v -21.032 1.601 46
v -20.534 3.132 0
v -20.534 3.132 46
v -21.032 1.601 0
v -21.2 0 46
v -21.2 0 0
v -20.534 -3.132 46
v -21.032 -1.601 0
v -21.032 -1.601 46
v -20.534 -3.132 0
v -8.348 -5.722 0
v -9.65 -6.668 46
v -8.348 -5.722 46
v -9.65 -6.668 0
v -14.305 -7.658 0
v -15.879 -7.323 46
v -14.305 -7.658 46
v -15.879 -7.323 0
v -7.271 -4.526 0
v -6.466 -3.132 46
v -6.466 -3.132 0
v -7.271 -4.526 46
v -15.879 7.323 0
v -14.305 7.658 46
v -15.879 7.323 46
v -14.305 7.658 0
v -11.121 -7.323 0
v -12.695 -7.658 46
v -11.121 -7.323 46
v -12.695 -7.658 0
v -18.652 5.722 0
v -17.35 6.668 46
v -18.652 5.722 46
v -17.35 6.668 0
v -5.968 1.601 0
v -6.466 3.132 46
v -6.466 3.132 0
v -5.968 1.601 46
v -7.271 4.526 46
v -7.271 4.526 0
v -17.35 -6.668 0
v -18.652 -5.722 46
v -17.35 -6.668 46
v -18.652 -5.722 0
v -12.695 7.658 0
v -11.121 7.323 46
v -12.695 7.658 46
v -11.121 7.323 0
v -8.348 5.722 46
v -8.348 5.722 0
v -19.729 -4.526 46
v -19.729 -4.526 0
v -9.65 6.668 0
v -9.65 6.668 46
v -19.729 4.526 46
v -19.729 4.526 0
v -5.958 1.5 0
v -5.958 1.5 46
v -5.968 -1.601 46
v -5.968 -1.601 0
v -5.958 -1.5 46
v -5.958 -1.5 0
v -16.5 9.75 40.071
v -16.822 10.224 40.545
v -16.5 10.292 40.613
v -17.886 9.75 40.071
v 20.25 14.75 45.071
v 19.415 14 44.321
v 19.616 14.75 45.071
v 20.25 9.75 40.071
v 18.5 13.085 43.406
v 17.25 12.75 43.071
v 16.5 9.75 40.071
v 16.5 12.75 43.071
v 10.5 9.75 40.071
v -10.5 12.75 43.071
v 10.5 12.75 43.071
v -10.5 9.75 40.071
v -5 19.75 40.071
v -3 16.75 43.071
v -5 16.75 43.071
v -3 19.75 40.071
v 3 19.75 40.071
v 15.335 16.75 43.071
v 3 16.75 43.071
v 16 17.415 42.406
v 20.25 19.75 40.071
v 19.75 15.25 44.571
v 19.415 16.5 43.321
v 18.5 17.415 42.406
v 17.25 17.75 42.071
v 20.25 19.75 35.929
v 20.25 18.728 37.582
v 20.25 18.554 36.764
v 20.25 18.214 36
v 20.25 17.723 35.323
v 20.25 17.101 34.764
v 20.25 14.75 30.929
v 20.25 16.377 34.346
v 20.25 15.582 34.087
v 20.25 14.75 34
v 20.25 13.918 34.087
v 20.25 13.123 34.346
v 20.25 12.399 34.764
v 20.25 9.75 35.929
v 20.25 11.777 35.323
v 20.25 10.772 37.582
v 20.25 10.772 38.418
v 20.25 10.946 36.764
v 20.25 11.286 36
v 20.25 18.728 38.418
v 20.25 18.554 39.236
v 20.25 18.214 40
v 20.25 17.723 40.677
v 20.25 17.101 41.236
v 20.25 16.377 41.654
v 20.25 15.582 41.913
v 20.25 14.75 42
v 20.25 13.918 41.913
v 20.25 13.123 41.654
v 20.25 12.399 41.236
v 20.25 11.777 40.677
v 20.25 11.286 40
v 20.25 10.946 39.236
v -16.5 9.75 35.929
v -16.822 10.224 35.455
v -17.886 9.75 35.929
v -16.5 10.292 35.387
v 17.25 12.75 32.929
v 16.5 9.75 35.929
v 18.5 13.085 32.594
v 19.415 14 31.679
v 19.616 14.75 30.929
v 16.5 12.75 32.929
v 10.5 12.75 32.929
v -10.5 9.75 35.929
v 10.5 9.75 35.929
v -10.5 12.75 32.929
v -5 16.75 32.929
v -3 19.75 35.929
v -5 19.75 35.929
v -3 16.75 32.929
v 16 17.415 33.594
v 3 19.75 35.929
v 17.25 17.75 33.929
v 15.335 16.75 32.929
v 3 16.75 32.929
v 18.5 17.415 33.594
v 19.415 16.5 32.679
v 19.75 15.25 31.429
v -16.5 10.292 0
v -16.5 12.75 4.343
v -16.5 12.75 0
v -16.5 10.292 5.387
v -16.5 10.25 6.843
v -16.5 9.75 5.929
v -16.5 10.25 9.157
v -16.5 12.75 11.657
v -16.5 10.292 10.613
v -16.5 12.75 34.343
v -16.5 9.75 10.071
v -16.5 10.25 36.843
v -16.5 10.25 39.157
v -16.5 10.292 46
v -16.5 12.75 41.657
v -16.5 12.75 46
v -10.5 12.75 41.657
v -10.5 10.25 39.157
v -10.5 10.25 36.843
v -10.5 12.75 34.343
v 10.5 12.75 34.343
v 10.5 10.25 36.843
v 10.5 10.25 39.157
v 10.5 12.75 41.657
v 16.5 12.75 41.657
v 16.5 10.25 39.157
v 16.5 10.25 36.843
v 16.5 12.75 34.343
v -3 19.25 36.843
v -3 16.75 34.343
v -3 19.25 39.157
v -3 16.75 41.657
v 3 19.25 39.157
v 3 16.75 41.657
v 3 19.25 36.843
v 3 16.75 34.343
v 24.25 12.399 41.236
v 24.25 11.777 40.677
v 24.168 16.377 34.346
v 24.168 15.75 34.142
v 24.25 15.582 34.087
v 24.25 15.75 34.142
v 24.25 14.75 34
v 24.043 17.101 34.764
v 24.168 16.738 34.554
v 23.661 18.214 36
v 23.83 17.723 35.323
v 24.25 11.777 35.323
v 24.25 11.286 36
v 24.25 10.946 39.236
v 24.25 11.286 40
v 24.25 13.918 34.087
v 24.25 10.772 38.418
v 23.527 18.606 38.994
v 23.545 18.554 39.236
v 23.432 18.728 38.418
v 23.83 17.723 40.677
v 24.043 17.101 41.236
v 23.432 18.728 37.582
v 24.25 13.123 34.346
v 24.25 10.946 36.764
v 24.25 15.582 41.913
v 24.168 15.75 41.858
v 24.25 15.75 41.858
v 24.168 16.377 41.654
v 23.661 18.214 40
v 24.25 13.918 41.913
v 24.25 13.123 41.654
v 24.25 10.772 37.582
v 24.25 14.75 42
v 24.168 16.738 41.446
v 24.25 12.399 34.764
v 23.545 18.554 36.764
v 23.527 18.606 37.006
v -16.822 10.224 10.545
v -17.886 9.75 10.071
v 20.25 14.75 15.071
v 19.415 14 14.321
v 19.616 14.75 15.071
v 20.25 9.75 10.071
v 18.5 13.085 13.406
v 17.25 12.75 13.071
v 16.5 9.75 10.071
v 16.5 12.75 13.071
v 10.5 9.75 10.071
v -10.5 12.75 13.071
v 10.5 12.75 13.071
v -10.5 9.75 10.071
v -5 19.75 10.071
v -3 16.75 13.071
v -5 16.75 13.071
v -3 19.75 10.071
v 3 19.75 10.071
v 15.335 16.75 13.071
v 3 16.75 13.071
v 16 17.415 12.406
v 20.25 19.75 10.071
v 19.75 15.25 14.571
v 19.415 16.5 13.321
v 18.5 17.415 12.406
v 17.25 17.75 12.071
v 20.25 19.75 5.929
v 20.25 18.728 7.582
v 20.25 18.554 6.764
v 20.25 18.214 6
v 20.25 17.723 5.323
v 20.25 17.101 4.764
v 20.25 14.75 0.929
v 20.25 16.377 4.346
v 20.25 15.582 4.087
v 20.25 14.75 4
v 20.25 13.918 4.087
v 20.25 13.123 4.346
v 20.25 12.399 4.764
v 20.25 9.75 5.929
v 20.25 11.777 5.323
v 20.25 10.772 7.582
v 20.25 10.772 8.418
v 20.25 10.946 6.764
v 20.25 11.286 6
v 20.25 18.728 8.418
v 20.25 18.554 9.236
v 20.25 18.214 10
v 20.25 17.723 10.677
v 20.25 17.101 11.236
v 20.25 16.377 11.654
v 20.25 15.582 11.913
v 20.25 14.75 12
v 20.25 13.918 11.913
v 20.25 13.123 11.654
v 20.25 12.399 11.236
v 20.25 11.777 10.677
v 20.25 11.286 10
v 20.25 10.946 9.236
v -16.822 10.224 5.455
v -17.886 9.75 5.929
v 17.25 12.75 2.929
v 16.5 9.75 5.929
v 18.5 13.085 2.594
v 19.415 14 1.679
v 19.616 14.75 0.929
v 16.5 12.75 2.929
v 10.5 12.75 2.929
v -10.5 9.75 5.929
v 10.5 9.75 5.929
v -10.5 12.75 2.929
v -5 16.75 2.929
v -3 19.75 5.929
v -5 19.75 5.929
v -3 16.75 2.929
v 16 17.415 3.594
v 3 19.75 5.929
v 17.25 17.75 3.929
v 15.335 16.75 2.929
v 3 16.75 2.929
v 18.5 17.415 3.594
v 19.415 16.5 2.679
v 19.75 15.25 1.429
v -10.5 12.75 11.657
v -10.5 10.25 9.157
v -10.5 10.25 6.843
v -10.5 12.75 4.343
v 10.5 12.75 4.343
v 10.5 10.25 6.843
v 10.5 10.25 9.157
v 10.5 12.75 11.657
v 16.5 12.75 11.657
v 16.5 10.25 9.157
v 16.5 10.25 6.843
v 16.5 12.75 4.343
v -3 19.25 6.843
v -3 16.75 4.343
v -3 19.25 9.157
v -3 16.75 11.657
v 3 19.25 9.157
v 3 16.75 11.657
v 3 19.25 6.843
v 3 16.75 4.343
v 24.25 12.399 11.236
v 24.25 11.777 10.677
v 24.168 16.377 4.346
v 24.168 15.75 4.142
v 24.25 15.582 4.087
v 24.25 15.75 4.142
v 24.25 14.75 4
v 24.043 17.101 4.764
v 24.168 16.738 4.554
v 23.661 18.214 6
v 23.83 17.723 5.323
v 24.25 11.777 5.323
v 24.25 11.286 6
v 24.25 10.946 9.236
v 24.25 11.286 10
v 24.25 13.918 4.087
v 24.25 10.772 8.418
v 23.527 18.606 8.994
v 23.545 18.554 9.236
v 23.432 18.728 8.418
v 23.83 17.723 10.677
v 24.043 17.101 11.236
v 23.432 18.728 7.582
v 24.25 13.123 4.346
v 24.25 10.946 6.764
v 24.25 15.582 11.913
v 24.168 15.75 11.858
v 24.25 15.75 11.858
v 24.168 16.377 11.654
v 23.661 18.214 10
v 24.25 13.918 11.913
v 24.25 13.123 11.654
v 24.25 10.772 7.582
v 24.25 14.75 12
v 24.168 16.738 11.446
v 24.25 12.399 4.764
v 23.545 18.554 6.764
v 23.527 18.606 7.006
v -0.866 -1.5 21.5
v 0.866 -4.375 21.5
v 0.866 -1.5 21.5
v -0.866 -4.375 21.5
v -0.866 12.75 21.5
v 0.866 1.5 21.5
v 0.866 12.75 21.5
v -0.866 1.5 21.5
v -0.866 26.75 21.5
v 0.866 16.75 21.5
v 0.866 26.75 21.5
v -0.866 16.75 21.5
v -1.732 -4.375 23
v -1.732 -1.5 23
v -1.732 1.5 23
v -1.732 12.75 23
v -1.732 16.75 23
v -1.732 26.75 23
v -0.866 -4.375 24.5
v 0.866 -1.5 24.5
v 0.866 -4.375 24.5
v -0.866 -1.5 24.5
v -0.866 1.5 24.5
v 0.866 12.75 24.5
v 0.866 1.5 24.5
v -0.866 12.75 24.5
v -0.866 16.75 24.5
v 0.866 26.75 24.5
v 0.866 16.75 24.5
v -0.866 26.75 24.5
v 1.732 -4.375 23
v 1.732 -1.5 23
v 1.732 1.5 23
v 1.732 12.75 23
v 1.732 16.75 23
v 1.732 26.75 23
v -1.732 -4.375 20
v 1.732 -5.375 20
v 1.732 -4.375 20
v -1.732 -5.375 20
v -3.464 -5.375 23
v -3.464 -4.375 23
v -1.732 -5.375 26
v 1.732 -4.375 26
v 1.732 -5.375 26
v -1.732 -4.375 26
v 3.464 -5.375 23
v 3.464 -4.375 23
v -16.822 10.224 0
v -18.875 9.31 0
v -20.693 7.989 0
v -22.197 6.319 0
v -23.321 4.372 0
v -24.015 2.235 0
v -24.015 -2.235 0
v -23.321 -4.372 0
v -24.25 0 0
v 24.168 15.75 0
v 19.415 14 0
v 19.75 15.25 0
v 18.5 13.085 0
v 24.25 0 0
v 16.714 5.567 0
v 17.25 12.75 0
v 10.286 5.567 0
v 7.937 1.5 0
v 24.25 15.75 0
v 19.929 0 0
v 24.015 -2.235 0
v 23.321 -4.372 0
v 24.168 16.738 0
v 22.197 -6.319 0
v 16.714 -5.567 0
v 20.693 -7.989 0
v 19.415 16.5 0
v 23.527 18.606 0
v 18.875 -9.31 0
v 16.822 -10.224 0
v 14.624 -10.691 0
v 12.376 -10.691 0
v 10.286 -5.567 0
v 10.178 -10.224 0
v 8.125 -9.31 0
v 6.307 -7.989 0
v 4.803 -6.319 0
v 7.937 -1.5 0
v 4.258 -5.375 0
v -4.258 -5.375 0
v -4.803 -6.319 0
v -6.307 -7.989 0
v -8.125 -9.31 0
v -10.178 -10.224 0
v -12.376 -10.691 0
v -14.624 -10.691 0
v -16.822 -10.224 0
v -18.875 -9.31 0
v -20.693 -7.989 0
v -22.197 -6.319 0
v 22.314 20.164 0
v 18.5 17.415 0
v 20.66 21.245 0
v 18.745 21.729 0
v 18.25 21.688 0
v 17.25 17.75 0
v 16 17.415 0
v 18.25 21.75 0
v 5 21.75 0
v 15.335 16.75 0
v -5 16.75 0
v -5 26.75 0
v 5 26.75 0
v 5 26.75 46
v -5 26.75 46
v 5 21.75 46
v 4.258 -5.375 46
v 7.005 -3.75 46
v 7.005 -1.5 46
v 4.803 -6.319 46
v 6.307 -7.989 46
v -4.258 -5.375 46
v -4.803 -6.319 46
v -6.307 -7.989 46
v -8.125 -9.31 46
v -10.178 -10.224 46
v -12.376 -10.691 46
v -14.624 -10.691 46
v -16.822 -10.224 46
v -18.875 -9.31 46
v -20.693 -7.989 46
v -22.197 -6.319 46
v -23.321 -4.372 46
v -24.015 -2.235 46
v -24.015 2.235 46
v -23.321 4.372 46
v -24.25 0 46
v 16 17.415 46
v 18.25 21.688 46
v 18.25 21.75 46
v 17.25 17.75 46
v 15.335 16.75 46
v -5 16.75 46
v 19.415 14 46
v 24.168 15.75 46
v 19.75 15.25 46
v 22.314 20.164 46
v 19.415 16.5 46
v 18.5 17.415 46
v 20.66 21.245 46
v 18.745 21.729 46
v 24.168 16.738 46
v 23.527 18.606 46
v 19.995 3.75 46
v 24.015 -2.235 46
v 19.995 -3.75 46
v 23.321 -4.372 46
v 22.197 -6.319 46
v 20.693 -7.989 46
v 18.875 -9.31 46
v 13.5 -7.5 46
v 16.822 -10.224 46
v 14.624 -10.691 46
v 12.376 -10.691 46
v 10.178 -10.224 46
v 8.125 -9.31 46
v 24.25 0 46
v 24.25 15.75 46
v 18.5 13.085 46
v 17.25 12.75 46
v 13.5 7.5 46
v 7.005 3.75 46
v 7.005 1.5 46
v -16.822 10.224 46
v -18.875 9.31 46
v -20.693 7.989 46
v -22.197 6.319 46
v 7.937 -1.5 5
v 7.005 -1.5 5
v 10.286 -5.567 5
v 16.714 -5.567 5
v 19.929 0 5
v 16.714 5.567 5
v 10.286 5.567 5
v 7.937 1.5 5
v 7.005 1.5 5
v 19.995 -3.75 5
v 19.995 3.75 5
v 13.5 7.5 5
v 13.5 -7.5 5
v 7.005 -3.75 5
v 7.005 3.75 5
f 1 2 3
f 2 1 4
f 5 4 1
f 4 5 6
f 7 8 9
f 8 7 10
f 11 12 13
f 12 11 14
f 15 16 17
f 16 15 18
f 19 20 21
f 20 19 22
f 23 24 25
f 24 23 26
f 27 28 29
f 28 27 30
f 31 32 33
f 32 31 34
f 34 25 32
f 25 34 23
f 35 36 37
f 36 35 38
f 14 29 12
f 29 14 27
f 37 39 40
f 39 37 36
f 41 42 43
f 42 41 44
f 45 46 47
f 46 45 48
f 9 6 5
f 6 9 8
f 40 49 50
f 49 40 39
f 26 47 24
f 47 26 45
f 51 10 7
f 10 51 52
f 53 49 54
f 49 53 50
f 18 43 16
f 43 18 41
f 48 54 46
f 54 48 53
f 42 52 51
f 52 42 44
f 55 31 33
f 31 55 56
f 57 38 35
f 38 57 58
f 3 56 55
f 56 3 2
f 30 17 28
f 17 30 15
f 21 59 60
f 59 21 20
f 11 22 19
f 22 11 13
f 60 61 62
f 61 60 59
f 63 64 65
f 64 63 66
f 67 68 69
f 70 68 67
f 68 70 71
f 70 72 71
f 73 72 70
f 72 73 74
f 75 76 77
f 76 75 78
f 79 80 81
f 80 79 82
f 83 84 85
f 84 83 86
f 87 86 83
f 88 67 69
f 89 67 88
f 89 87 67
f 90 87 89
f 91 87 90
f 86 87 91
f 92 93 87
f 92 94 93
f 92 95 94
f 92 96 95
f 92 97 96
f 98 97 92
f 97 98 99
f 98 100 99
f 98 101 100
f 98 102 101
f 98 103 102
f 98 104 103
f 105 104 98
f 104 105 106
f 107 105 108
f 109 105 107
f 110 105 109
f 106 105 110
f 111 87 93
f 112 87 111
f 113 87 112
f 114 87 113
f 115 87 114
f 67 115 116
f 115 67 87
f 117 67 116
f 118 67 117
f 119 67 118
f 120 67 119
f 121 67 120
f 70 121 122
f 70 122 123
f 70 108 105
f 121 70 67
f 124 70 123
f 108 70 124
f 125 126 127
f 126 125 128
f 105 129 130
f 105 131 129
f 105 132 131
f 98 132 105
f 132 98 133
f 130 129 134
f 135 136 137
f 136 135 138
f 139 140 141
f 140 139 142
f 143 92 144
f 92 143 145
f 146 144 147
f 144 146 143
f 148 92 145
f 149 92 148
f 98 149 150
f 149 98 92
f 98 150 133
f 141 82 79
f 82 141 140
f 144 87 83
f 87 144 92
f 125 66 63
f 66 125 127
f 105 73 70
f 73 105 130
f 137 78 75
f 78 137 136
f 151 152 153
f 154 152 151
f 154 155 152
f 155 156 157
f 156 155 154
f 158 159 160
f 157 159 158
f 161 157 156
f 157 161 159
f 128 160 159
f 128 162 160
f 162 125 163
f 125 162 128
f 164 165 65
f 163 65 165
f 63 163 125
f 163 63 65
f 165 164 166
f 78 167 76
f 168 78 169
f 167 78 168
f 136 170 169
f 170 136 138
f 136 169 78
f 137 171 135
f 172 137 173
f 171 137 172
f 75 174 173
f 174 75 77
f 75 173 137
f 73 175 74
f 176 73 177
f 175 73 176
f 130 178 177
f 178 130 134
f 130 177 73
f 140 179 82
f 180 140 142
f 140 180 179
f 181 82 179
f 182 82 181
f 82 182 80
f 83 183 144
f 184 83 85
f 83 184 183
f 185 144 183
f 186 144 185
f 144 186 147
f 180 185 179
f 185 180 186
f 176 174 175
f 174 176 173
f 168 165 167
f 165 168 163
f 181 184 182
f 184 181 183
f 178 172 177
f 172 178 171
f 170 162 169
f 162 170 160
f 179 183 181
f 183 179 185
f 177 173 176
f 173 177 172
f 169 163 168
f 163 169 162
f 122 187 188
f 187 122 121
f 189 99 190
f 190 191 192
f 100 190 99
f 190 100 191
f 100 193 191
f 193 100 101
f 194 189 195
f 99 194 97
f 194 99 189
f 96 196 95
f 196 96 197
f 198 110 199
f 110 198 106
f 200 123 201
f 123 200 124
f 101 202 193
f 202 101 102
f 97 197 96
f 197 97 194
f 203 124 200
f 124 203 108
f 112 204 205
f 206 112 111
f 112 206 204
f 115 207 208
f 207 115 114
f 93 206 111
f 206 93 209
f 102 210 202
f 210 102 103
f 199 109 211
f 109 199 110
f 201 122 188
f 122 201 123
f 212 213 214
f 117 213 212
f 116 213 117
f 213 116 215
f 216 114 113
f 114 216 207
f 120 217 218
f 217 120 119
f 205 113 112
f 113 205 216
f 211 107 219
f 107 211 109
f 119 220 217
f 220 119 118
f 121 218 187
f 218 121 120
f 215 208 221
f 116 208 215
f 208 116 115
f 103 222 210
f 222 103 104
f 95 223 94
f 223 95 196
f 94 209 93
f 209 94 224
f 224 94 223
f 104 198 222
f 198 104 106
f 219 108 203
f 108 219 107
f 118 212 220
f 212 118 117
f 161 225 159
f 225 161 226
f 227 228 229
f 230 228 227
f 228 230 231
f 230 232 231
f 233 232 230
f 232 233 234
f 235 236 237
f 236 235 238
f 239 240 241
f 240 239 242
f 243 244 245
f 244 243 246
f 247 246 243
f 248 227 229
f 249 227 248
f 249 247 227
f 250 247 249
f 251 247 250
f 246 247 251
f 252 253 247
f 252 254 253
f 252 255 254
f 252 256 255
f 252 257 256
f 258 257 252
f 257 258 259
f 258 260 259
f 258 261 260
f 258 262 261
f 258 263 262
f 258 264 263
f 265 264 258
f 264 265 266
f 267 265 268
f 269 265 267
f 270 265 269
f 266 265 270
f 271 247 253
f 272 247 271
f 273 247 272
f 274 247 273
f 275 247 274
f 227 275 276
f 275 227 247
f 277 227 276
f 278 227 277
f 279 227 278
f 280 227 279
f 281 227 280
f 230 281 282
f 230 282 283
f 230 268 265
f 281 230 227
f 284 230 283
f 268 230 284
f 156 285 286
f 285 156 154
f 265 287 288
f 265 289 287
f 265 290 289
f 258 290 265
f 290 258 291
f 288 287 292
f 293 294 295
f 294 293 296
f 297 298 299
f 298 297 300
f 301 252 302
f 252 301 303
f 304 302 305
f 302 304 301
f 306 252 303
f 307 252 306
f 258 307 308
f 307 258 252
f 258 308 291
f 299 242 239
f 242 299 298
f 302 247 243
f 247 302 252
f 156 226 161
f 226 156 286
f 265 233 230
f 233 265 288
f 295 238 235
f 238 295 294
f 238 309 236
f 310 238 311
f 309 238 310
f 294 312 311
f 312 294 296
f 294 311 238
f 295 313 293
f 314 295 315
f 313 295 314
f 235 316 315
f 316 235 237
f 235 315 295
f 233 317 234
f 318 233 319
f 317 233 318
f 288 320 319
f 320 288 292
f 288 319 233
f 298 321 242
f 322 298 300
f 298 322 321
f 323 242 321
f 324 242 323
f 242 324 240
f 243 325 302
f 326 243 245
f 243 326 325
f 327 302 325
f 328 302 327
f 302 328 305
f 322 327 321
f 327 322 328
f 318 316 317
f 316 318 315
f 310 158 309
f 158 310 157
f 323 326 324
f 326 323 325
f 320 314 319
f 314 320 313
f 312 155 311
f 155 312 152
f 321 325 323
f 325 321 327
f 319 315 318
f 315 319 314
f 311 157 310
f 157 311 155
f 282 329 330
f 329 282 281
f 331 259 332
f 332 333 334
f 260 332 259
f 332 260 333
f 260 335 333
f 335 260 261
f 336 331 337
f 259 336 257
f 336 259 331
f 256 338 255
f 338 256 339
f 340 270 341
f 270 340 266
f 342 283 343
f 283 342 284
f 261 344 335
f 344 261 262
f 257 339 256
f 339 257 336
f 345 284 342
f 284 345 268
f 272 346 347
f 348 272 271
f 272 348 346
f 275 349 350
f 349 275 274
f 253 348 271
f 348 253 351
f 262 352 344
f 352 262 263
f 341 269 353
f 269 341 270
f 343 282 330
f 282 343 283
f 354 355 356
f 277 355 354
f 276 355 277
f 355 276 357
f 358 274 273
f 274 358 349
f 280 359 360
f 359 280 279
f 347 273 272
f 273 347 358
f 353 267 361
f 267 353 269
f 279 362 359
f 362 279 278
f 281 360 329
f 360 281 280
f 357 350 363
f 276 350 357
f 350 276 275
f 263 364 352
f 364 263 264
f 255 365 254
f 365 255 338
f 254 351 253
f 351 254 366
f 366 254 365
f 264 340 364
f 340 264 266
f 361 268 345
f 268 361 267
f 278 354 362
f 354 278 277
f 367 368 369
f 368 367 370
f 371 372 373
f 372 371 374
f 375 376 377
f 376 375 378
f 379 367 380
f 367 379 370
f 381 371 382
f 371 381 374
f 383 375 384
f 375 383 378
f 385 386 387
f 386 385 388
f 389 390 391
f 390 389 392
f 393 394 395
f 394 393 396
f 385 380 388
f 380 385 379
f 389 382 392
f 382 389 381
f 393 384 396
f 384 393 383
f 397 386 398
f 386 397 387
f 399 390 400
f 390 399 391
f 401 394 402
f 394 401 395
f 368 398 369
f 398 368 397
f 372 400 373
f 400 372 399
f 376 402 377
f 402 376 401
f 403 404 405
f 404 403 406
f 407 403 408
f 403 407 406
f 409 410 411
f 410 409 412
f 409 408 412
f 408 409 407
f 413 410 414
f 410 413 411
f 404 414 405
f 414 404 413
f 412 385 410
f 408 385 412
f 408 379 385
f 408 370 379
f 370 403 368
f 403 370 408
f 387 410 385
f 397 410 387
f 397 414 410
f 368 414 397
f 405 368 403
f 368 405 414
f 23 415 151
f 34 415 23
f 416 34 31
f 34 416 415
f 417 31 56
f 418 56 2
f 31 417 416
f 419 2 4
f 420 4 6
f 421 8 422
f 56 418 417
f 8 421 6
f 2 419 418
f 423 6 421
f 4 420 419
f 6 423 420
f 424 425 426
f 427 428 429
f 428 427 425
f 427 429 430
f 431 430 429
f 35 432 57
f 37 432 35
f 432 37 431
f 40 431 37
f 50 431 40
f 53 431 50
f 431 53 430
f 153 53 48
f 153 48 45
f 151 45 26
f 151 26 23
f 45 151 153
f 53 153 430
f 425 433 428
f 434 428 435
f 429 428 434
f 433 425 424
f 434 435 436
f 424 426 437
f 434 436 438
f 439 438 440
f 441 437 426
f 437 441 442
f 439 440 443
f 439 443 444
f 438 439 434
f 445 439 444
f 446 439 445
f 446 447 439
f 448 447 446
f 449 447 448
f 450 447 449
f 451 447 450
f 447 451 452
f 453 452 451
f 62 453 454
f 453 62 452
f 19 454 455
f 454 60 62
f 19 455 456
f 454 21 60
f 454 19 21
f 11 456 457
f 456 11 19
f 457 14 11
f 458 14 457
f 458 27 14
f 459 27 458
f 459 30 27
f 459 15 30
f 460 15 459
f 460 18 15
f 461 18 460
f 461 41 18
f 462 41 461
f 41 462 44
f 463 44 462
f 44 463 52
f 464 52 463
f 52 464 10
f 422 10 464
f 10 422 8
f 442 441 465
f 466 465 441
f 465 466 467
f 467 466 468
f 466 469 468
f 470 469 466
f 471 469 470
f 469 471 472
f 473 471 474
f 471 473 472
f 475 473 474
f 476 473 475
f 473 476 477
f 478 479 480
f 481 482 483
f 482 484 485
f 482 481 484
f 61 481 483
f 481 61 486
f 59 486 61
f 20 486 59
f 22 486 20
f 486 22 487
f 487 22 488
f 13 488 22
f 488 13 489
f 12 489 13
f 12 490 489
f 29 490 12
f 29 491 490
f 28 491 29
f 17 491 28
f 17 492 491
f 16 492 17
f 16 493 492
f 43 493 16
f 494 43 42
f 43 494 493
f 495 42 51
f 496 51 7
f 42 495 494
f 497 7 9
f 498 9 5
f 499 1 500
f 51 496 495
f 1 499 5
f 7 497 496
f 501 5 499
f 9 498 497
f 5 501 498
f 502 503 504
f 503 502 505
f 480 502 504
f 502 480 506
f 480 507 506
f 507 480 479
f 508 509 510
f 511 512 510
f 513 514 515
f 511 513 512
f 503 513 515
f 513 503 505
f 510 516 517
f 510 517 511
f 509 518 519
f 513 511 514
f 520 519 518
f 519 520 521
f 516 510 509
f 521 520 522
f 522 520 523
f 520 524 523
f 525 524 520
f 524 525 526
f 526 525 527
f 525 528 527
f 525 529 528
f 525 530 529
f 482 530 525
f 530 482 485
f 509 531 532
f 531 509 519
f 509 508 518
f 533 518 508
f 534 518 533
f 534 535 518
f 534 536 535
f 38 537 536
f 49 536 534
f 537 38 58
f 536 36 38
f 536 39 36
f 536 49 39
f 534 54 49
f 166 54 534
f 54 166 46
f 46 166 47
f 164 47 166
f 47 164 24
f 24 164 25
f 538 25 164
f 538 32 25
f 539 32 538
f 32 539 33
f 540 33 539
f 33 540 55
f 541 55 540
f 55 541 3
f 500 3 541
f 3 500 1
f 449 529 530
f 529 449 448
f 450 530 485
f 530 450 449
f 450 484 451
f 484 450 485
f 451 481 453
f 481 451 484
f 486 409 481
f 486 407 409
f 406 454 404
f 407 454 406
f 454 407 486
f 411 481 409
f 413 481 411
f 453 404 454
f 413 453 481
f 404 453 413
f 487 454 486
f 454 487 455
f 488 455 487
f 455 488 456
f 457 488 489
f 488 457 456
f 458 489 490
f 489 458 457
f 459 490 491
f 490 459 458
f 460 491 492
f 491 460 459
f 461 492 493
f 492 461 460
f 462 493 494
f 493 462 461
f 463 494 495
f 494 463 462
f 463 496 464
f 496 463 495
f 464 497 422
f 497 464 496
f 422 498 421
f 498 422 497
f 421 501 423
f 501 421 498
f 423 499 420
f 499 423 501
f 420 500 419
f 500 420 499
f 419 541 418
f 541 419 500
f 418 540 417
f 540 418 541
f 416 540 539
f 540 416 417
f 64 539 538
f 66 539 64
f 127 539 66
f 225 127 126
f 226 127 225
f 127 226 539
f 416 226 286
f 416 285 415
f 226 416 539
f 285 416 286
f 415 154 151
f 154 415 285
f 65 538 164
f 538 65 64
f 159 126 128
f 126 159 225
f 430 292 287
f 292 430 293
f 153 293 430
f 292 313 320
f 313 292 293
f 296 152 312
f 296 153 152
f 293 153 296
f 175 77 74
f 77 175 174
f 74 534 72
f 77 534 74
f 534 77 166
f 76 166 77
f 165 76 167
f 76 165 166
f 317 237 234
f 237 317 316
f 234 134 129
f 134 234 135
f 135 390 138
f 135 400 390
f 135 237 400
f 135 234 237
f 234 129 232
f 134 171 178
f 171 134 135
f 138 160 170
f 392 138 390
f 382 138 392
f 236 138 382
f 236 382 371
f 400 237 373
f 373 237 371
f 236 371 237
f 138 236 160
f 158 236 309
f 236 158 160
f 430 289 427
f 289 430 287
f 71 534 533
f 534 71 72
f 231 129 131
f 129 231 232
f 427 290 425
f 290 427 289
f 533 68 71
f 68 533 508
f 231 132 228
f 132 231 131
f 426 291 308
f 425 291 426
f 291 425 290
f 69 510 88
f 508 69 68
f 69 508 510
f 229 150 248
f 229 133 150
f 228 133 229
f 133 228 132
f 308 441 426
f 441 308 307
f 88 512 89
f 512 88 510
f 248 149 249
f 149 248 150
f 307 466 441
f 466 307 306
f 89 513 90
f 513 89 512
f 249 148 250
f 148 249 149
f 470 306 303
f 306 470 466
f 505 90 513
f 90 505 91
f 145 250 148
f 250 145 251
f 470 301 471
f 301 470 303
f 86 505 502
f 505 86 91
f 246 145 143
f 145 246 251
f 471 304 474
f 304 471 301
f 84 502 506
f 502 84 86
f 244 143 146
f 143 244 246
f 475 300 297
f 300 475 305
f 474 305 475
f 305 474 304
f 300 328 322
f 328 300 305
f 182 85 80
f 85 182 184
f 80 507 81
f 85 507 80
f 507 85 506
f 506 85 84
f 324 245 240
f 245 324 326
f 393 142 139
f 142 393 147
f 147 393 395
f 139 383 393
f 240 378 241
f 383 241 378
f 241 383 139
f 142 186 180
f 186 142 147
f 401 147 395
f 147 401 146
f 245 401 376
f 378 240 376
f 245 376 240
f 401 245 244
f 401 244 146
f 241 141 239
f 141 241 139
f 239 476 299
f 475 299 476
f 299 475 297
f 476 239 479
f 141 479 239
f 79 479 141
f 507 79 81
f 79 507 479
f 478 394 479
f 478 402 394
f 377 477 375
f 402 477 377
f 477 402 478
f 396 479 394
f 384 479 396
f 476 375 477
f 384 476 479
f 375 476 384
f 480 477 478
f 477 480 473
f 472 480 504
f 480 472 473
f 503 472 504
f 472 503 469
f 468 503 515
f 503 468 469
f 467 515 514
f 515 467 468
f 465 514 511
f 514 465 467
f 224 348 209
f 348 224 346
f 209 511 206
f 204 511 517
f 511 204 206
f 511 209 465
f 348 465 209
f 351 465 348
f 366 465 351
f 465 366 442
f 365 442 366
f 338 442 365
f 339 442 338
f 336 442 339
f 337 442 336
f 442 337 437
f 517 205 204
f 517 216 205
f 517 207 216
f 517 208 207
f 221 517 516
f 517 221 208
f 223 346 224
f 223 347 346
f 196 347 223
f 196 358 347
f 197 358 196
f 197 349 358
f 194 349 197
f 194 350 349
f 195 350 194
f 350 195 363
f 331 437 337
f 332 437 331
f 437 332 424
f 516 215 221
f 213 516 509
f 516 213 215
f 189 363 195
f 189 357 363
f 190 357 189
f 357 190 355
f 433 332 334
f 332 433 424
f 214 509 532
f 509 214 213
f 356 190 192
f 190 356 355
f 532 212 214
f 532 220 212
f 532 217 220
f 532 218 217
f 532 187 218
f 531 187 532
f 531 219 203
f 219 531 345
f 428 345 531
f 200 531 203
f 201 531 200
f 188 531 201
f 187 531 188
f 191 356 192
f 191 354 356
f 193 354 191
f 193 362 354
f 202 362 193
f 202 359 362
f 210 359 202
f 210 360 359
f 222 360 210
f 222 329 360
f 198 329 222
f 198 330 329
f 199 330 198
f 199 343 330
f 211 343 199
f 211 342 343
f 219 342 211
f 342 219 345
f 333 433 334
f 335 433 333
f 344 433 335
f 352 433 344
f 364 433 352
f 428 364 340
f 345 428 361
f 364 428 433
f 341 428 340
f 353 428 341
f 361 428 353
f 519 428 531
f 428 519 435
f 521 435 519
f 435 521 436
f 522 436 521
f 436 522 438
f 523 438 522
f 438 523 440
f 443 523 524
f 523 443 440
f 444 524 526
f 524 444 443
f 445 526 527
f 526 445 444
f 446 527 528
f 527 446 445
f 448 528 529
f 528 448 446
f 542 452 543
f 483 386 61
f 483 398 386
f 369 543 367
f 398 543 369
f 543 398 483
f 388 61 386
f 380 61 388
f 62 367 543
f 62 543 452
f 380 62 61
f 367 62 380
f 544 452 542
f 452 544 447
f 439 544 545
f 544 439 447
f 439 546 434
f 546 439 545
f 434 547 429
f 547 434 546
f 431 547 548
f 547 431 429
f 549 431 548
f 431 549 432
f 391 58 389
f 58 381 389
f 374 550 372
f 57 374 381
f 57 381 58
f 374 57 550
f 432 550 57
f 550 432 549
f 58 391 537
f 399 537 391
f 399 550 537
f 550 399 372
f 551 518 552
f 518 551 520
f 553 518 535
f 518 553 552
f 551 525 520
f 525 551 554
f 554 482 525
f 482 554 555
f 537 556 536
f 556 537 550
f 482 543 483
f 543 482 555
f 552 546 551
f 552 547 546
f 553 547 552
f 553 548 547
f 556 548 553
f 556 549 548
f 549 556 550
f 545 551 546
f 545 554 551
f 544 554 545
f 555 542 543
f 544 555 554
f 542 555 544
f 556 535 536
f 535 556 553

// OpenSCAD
// file: settings.scad
rod_size = 8;
rod_nut_size = 15; //12 for M6, 15 for M8
bearing_size = 15.5; //12.5 for LM6UU, 15.5 for LM8UU,LM8SUU
bearing_length = 24.5; //19.5 for LM6UU, 17.5 for LM8SUU, 24.5 for LM8UU
yz_motor_distance = 25;
motor_screw_spacing = 26; //26 for NEMA14, 31 for NEMA17
motor_casing = 38; //38 for NEMA14, 45 for NEMA17
end_height = 40; //measure the height of your motor casing and add 4mm. Suggestion: 40 for NEMA14, 55 for NEMA17
bed_mount_height = 16;
//x_rod_spacing = motor_screw_spacing + 3 + rod_size;
x_rod_spacing = 30;
x_carriage_width = 70;
carriage_extruder_offset = 5;
pulley_size = 20;
idler_pulley_width = 10;
gusset_size = 15;
m3_size = 3;
m3_nut_size = 6;
// m3 nut height is because tristan doesn't know the height of an m3 nut, it is not implemented everywhere, just on the z stop in base_end_2off.scad
m3_nut_height = 2;
m4_size = 4;
motor_shaft_size = 5;
z_stop_screw_spacing = 10;
// these may be super unneeded, in which case we can easily do a search and replace. But they may be really useful for prototyping/whatever.
z_stop_mount_x_buffer = 2;
z_stop_mount_y_buffer = 2;
z_stop_mount_z_buffer = 2;
z_stop_side_holes = true;
z_stop_bottom_holes = false;

// ratio for converting diameter to apothem
da6 = 1 / cos(180 / 6) / 2;
da8 = 1 / cos(180 / 8) / 2;
// main file
include <settings.scad>;

!x_end(0);

module x_end(motor = 0) mirror([(motor == 0) ? 1 : 0, 0, 0]) difference() {
	union() {
		if(motor > 0) translate([-(motor_casing / 2 + rod_size + bearing_size + 8) / 2 - motor_casing, 8 + rod_size, 0]) rotate([90, 0, 0]) {
			// Motor holder
			linear_extrude(height = 7) difference() {
				square([motor_casing + 3, x_rod_spacing + 8 + rod_size]);
				translate([motor_casing / 2, (x_rod_spacing + 8 + rod_size) / 2, 0]) {
					circle(motor_screw_spacing / 2);
					for(x = [1, -1]) for(y = [1, -1]) translate([x * motor_screw_spacing / 2, y * motor_screw_spacing / 2, 0]) circle(m3_size * da6, $fn = 6);
					translate([-(motor_casing * 1.5 - motor_screw_spacing), (motor > 1) ? (motor_casing / 2 - motor_screw_spacing) : 0, 0]) square([motor_casing, x_rod_spacing + 8 + rod_size]);
				}
			}
			// Belt
			%translate([motor_casing / 2, (x_rod_spacing + 8 + rod_size) / 2, rod_size / 2 - 2 - bearing_size / 2 - 2 - idler_pulley_width / 2]) rotate([180, 0, 0]) linear_extrude(height = 5, convexity = 5) difference() {
				union() {
					circle(pulley_size / 2 + 2);
					translate([0, -pulley_size / 2 - 2, 0]) square([200.5, pulley_size + 4]);
					translate([200.5, 0, 0]) circle(pulley_size / 2 + 2);
				}
				circle(pulley_size / 2);
				translate([0, -pulley_size / 2, 0]) square([200.5, pulley_size]);
				translate([200.5, 0, 0]) circle(pulley_size / 2);
			}

		}
		linear_extrude(height = x_rod_spacing + 8 + rod_size, convexity = 5) difference() {
			union() {
				for(side = [1, -1]) translate([side * (motor_casing / 4 + rod_size / 2), 0, 0]) circle(bearing_size / 2 + 3, $fn = 30);
				square([motor_casing / 2 + rod_size, bearing_size / 2 + 3], center = true);
				translate([-(motor_casing / 2 + rod_size + bearing_size + 6) / 2, 0, 0]) square([(motor_casing / 2 + rod_size + bearing_size / 2 + 3 + 3) / 2, bearing_size / 2 + 4 + rod_size / 2]);
				translate([-(motor_casing / 2 + rod_size + bearing_size + 6) / 2, 0, 0]) square([motor_casing / 2 + rod_size + bearing_size / 2 + 3 + 3, bearing_size / 2 + 3 + rod_size / 2]);
				translate([-(motor_casing / 2 + rod_size + bearing_size + 6) / 2 + rod_size / 2 + 2, 0, 0]) square([(motor_casing / 2 + rod_size + bearing_size + 6) / 2 + 5 - rod_size / 2 - 2, bearing_size / 2 + 6 + rod_size]);
				translate([-(motor_casing / 2 + rod_size + bearing_size + 6) / 2 + rod_size / 2 + 2, bearing_size / 2 + rod_size / 2 + 4, 0]) circle(rod_size / 2 + 2);
				translate([0, bearing_size / 2 + rod_size + 6, 0]) square(10, center = true);
			}
			square([motor_casing / 2 + rod_size, 3], center = true);
			translate([(motor_casing / 4 + rod_size / 2), 0, 0]) circle(bearing_size / 2 - .5, $fn = 30);
			translate([-(motor_casing / 4 + rod_size / 2), 0, 0]) circle(rod_nut_size * 6/14, $fn = 6);
			translate([4 + rod_size / 2, bearing_size / 2 + rod_size / 2 + 3, 0]) {
				square([motor_casing / 2 + rod_size + bearing_size + 8, rod_size / 2], center = true);
				translate([-(motor_casing / 2 + rod_size + bearing_size + 8) / 2, .5, 0]) circle(rod_size / 4 + .5, $fn = 12);
			}
		}
	}
    // x rod slots and clamping screw holes
	translate([0, 0, (x_rod_spacing + rod_size + 8) / 2]) {
		for(end = [0, 1]) mirror([0, 0, end]) translate([motor_casing / 4 + rod_size / 2, 0, -(x_rod_spacing + rod_size + 8) / 2 - 1]) cylinder(r = bearing_size / 2 - .05, h = bearing_length, $fn = 30);
		for(side = [1, -1]) render(convexity = 5) translate([0, bearing_size / 2 + rod_size / 2 + 3, side * x_rod_spacing / 2]) rotate([0, 90, 0]) {
			cylinder(r = rod_size / 2, h = motor_casing / 2 + rod_size + bearing_size + 10, center = true, $fn = 30);
			difference() {
				translate([0, 0, (motor > -1) ? rod_size / 2 + 2 : 0]) intersection() {
					rotate(45) cube([rod_size + 2, rod_size + 2, motor_casing / 2 + rod_size + bearing_size + 10], center = true);
					cube([rod_size * 2, rod_size + 2, motor_casing / 2 + rod_size + bearing_size + 10], center = true);
				}
				translate([0, rod_size, 0]) cube([rod_size * 2, rod_size * 2, 6], center = true);
				for(end = [1, -1]) translate([0, -rod_size, end * (motor_casing / 4 + rod_size / 2)]) cube([rod_size * 2, rod_size * 2, 6], center = true);
			}
			translate([0, 0, rod_size / 2 + 2]) intersection() {
				rotate(45) cube([rod_size, rod_size, motor_casing / 2 + rod_size + bearing_size + 10], center = true);
				cube([rod_size * 2, rod_size + 1, motor_casing / 2 + rod_size + bearing_size + 10], center = true);
			}
		}
		// holes for clamping screws
		rotate([90, 0, 0]) {
			cylinder(r = m3_size * da6, h = 100, center = true, $fn = 6);
			translate([0, 0, bearing_size / 4 + .5]) cylinder(r = m3_nut_size * da6, h = 100, center = false, $fn = 6);
		}
	}
    // hole for the z drive bolt
	translate([-(motor_casing / 4 + rod_size / 2), 0, 5]) rotate(90) cylinder(r = rod_nut_size / 2, h = x_rod_spacing + 8 + rod_size, $fn = 6);
    // smoothbore rod
	translate([(motor_casing / 4 + rod_size / 2), 0, 5]) %rotate(180 / 8) cylinder(r = rod_size * da8, h = 200, center = true, $fn = 8);
}
